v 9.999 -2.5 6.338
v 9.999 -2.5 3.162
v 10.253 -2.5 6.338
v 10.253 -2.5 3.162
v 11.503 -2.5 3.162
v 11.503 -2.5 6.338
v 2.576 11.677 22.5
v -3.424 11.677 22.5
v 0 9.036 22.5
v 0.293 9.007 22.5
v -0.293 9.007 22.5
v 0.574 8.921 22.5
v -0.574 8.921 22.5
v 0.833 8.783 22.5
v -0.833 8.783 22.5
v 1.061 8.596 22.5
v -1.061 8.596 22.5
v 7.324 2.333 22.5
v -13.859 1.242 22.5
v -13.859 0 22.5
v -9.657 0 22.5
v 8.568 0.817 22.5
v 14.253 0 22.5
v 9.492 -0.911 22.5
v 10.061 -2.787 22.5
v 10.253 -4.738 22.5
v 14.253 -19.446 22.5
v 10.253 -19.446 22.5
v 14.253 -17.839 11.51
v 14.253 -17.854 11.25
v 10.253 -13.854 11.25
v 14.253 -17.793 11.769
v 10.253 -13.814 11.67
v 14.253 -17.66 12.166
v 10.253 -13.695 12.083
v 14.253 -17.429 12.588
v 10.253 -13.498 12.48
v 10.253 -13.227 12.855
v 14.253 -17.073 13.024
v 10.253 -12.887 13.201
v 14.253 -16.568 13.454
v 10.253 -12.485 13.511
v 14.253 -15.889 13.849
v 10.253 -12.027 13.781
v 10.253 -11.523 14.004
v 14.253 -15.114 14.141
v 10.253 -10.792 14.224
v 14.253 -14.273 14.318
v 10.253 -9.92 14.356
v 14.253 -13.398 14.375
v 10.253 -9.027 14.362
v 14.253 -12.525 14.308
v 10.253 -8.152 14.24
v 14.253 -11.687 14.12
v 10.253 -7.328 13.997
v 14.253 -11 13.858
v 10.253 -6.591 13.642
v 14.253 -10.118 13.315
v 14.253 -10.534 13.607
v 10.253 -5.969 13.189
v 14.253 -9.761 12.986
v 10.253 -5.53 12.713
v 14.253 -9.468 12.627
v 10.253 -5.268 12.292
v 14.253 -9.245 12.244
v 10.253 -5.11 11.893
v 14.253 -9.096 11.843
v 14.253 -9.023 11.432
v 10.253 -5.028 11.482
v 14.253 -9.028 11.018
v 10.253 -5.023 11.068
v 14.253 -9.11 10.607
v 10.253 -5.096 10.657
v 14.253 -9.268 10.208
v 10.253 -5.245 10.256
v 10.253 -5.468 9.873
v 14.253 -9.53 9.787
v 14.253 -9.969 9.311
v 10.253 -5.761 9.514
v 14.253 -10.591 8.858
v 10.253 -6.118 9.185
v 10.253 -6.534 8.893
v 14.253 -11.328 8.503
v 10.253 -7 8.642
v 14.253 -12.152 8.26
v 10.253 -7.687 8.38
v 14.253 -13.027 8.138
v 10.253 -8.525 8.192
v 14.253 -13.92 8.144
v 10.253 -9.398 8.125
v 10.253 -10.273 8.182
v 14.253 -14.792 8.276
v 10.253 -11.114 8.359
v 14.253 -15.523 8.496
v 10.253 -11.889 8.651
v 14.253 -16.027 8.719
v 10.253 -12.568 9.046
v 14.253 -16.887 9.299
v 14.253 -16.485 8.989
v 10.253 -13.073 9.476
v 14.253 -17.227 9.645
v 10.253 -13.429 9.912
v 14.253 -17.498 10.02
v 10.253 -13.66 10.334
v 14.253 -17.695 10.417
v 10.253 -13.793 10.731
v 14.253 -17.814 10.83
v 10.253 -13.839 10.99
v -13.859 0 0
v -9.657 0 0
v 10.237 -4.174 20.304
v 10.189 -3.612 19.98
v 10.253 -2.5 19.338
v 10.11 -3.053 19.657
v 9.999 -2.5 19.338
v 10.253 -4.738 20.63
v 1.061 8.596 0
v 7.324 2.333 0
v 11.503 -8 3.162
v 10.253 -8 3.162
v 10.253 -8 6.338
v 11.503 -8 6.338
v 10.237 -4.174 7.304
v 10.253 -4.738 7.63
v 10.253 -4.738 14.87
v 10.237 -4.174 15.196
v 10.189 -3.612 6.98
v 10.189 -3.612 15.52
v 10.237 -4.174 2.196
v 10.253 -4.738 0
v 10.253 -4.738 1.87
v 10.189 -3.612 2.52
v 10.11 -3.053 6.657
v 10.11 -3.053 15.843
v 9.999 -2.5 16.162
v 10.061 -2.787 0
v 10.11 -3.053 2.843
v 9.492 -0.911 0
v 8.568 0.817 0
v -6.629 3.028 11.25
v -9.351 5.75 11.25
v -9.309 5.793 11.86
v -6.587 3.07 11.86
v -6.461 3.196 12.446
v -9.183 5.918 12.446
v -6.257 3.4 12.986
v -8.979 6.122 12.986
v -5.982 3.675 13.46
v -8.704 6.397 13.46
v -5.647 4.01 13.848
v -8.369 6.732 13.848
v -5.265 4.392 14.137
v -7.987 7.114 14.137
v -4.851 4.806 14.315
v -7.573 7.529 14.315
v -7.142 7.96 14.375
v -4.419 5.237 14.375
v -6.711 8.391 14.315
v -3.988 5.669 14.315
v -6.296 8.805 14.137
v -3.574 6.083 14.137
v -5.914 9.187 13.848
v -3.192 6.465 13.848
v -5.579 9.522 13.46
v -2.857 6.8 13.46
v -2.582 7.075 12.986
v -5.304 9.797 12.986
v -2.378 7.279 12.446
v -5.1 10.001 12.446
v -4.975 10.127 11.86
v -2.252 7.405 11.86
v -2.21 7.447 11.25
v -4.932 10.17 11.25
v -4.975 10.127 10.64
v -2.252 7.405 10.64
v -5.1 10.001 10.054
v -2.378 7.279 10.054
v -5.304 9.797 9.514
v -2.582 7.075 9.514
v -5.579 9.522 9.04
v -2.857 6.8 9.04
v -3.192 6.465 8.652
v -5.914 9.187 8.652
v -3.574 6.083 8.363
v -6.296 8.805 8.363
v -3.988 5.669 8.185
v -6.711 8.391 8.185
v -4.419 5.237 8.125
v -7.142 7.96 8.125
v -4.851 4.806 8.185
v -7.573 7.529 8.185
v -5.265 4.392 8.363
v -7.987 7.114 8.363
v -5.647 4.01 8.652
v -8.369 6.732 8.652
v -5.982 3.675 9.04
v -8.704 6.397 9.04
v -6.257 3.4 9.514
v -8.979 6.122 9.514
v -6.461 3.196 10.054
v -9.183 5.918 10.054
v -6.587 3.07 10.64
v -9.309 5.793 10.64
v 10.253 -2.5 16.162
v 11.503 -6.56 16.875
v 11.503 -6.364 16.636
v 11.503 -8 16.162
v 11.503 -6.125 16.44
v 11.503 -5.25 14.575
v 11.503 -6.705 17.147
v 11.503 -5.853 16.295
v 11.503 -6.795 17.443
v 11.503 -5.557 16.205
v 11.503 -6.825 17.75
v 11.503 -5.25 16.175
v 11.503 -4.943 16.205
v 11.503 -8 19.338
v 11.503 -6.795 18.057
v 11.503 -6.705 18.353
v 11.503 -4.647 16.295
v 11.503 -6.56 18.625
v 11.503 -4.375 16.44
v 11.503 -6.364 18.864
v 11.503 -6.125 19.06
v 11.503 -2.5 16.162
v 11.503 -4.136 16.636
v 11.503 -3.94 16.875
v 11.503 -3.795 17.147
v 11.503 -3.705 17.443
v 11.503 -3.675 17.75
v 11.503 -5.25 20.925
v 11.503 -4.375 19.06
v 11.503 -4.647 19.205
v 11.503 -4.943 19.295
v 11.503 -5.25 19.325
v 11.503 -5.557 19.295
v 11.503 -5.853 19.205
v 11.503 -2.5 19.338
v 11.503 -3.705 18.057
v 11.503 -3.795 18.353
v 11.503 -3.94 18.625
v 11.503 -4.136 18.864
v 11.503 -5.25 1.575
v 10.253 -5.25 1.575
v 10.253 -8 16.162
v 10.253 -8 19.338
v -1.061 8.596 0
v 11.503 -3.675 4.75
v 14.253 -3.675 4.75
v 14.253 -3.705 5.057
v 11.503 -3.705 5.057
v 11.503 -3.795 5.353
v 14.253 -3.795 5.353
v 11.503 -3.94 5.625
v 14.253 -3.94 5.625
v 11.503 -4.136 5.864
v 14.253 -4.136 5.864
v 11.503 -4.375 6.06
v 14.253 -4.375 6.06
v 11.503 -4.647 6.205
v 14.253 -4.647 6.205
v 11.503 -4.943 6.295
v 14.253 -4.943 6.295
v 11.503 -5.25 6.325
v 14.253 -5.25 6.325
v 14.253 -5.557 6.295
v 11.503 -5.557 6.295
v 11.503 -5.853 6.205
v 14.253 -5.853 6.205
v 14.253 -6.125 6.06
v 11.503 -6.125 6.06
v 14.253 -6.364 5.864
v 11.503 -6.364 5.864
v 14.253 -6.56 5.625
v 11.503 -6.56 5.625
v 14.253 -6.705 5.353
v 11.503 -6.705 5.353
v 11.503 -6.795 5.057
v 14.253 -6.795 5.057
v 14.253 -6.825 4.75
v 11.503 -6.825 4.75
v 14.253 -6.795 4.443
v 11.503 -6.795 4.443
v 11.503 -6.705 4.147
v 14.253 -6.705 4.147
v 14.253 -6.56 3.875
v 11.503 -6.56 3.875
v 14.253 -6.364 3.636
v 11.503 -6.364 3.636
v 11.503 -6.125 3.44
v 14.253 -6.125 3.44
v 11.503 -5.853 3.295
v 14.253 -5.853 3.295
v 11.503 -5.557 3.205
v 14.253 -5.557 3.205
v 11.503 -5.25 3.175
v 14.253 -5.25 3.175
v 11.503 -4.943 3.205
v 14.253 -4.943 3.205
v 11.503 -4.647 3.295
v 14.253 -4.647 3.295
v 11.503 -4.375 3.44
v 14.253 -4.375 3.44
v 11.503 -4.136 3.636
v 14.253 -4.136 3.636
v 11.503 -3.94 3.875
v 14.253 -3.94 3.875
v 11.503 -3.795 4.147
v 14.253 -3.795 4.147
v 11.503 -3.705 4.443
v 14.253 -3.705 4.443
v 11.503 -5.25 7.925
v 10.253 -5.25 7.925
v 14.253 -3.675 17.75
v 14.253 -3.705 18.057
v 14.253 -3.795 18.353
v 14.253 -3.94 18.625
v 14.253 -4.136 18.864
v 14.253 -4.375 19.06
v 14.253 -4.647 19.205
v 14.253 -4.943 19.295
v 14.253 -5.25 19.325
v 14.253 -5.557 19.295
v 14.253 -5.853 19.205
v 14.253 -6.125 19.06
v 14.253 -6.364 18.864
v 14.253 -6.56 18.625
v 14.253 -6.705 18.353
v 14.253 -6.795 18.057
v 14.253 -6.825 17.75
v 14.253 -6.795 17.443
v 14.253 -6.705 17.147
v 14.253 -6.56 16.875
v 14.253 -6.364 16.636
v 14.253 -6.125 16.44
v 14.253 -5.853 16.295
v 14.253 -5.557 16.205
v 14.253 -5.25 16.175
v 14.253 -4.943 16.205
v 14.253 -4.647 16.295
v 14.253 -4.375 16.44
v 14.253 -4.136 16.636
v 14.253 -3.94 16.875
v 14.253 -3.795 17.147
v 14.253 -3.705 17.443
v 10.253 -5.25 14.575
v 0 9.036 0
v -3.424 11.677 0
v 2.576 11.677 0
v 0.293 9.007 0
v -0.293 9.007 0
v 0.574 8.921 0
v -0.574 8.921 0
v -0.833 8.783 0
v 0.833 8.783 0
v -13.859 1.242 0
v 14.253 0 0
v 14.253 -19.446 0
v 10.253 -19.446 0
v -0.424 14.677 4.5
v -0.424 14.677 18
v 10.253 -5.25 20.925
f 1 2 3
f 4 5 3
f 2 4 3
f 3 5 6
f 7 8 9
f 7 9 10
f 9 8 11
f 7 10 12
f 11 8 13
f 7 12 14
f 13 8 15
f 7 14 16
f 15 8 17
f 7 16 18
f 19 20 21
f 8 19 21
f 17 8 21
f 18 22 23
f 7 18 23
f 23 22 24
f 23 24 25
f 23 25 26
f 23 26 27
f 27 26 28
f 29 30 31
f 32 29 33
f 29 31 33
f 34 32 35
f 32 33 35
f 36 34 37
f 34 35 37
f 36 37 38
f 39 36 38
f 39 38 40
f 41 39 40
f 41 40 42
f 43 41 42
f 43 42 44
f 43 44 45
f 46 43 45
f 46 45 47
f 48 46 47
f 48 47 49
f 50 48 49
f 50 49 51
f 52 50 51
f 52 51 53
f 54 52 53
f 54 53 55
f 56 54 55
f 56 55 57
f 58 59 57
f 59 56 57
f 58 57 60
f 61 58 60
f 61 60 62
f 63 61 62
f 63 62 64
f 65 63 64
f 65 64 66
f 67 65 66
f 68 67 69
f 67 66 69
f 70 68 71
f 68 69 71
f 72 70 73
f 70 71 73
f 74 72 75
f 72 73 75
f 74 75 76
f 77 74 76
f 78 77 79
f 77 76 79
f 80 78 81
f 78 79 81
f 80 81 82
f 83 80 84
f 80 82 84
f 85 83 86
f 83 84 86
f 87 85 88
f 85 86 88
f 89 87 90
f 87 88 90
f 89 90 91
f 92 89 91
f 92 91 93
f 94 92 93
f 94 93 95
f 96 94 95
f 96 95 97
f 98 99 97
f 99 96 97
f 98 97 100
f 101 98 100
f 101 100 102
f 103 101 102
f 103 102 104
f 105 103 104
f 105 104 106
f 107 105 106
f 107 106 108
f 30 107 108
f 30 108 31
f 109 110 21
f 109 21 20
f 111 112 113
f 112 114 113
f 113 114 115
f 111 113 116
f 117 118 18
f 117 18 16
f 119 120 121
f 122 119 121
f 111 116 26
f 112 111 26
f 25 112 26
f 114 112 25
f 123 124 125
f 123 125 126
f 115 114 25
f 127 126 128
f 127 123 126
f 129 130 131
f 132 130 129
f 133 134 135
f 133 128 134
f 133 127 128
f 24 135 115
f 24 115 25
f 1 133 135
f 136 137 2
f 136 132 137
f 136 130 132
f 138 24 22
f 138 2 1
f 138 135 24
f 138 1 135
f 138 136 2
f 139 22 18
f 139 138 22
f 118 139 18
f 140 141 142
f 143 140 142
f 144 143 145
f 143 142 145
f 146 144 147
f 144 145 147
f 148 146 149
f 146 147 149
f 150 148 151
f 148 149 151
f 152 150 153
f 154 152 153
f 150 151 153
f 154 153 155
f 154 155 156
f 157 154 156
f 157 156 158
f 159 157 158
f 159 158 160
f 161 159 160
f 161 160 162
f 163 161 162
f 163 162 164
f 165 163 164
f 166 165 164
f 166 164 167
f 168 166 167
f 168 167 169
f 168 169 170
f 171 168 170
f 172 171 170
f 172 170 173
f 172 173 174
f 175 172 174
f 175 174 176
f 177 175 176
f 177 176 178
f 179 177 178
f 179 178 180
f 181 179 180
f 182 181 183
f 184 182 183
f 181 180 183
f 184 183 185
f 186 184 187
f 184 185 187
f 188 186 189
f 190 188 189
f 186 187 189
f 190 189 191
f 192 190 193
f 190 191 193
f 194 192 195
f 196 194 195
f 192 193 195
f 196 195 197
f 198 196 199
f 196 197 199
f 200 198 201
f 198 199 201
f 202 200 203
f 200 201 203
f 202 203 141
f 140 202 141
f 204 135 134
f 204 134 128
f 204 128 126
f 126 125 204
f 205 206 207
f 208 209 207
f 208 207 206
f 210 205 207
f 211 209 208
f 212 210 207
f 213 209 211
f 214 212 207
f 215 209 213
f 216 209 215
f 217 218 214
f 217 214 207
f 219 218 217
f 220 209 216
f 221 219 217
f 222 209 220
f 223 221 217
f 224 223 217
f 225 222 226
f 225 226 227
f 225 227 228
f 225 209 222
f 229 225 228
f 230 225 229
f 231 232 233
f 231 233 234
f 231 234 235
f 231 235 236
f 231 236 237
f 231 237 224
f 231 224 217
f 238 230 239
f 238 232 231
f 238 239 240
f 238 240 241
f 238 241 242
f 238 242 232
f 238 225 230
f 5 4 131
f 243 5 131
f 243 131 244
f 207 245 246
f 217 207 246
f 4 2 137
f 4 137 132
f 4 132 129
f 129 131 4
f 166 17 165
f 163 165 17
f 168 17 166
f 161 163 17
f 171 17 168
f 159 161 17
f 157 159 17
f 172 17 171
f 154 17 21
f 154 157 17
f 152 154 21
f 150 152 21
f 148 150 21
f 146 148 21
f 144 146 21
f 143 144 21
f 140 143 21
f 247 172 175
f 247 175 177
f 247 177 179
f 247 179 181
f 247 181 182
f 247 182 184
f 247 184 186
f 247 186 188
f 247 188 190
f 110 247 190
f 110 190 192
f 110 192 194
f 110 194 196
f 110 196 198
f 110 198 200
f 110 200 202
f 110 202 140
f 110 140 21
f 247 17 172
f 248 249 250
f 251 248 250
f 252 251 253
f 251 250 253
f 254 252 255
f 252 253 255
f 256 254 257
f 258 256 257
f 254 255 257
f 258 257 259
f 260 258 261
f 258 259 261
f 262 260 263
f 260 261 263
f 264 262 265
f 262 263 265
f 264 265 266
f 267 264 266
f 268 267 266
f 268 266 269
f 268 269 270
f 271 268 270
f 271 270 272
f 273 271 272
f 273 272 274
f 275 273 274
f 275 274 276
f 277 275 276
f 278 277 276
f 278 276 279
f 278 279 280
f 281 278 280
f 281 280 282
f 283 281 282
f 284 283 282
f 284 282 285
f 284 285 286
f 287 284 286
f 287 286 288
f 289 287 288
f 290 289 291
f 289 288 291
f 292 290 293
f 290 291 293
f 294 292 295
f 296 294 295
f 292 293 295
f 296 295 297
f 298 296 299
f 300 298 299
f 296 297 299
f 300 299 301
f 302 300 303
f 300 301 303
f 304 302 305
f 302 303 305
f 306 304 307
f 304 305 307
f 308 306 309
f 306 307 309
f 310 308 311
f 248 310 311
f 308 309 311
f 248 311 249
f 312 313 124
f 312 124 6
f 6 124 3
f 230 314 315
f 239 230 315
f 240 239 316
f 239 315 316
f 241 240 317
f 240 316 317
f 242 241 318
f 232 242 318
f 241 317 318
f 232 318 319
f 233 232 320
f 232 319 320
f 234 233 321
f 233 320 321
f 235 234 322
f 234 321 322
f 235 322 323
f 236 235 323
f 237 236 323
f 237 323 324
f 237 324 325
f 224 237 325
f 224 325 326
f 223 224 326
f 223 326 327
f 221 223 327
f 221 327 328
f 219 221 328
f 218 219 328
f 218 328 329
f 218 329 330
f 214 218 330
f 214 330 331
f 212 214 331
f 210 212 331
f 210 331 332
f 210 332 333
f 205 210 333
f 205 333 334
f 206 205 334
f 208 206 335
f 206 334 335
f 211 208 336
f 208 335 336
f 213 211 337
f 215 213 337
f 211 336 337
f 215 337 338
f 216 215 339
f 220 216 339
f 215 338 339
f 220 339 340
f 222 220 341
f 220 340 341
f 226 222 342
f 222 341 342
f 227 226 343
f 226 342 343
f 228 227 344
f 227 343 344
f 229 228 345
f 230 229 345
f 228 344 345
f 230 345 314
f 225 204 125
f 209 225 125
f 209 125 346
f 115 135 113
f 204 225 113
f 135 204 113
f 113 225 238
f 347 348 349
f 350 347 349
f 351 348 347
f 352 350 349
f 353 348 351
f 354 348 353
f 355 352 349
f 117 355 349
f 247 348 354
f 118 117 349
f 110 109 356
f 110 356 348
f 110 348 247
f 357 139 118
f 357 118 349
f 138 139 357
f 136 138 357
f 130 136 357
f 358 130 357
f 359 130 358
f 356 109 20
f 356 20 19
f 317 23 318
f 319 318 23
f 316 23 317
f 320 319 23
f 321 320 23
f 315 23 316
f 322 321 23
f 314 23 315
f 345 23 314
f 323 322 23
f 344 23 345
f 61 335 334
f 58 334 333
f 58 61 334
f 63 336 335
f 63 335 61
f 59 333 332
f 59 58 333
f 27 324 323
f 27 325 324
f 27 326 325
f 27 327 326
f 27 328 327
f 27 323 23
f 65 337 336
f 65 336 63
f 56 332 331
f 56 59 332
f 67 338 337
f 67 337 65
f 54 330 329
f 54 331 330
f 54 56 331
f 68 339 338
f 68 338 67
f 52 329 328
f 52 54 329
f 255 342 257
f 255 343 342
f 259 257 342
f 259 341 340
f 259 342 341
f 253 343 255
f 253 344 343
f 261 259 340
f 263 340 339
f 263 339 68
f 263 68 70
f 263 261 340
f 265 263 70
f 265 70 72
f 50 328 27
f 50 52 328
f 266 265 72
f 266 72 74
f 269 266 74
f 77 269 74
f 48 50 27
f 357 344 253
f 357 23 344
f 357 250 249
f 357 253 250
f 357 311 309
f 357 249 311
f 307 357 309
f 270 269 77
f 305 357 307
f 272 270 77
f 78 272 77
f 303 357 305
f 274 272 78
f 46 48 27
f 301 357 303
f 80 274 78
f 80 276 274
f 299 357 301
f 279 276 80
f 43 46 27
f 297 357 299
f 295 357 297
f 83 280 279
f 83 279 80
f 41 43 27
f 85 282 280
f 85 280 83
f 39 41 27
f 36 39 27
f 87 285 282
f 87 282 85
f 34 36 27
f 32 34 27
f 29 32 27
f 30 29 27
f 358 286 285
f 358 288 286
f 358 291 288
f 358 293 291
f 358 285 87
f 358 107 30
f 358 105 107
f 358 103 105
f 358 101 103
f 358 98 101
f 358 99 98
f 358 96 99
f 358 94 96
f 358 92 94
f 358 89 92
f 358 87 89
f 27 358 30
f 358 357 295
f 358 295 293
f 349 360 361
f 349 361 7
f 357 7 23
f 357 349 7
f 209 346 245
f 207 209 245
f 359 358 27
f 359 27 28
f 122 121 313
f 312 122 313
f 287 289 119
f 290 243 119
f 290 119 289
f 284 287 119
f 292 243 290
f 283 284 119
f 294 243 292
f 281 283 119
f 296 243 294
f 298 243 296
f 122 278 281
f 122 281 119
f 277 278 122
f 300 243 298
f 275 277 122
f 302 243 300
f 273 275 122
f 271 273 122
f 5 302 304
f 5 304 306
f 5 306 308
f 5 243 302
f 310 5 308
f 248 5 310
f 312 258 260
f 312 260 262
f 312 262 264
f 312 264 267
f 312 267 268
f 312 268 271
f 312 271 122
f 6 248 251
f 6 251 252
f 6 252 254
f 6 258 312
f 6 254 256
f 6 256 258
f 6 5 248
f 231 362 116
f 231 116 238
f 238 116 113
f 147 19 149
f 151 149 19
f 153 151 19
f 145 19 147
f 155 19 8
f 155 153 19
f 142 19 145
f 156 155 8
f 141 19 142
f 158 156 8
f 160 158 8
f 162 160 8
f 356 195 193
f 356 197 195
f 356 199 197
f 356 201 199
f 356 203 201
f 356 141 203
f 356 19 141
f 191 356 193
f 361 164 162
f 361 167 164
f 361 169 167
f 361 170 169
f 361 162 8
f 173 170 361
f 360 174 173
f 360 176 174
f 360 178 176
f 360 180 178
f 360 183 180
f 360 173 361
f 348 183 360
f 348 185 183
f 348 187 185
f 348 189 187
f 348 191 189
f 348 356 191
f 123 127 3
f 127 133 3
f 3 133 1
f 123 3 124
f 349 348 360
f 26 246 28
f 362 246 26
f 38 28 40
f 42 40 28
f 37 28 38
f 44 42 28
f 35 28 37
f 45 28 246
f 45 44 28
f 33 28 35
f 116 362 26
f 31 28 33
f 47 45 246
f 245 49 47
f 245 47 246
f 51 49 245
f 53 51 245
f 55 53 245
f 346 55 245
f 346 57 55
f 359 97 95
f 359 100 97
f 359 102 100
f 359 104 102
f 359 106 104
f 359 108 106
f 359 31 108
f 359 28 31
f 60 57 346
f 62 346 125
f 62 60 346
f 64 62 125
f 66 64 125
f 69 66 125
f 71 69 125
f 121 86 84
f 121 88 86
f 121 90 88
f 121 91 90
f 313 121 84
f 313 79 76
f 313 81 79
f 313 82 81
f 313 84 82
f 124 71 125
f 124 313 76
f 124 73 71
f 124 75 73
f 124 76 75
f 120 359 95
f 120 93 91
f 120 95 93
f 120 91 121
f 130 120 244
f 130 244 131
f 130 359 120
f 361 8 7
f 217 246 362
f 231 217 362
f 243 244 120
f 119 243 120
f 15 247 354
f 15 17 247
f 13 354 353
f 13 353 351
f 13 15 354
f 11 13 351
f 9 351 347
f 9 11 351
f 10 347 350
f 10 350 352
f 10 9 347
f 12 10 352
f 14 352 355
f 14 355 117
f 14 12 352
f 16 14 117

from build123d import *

# Parameters (mm, degrees)
EXTRUDE_505_DEPTH      = 22.5
SKETCH_2_R             = 3.125
SMA_DEPTH              = 42.358123054
SKETCH_3_R             = 1.575
CUT_EXTRUDE_957_DEPTH  = 41.923198727
CUT_EXTRUDE_2_DEPTH    = 1.25
CUT_EXTRUDE_1673_DEPTH = 42.700155069
FILLET_1_R             = 10
FILLET_2_R             = 1.5


with BuildPart() as part:
    # Sketch 1 → Extrude 505 (new body)
    with BuildSketch(Plane.XY):
        Polygon((14.253048327, 0), (14.253048327, -19.446194078), (10.253048327, -19.446194078), (10.253048327, -0.596194078), (0, 9.656854249), (-9.656854249, 0), (-13.859292911, 0), (-13.859292911, 1.242283553), (-0.424264069, 14.677312396), align=None)
    extrude(amount=EXTRUDE_505_DEPTH)

    # Sketch 2 → SMA接口 (cut, through all)
    with BuildSketch(Plane(origin=(-7.550788232, 7.550788232, 0), x_dir=(0, 0, 1), z_dir=(-0.7071067811865486, 0.7071067811865465, 0))):
        with Locations(Location((11.25, 0.578427125, 0), (0, 0, 270))):
            Circle(SKETCH_2_R)
    extrude(amount=-SMA_DEPTH, mode=Mode.SUBTRACT)

    # 草图3 → Cut-Extrude 957 (cut, through all)
    with BuildSketch(Plane(origin=(14.253048327, 0, 0), x_dir=(0, 0, -1), z_dir=(1, 0, 0))):
        with Locations(Location((-17.75, -5.25, 0), (0, 0, 90))):
            Circle(SKETCH_3_R)
        with Locations(Location((-4.75, -5.25, 0), (0, 0, 90))):
            Circle(SKETCH_3_R)
    extrude(amount=-CUT_EXTRUDE_957_DEPTH, mode=Mode.SUBTRACT)

    # 草图4 → 侧板接口-2 (cut)
    with BuildSketch(Plane.ZY.offset(-10.253048327)):
        Polygon((6.33771324, -8), (7.925426481, -5.25), (6.33771324, -2.5), (3.16228676, -2.5), (1.574573519, -5.25), (3.16228676, -8), align=None)
        Polygon((19.33771324, -8), (20.925426481, -5.25), (19.33771324, -2.5), (16.16228676, -2.5), (14.574573519, -5.25), (16.16228676, -8), align=None)
    extrude(amount=-CUT_EXTRUDE_2_DEPTH, mode=Mode.SUBTRACT)

    # 草图7 → Cut-Extrude 1673 (cut, through all)
    with BuildSketch(Plane(origin=(0, 8.084293197, -5.389528798), x_dir=(-1, 0, 0), z_dir=(0, -0.8320502943378436, 0.5547001962252295))):
        Polygon((0.424264069, -11.885734391), (-2.575735931, -6.477407477), (3.424264069, -6.477407477), align=None)
    cut_extrude_1673 = extrude(amount=-CUT_EXTRUDE_1673_DEPTH, mode=Mode.SUBTRACT)

    # 镜向1: Cut-Extrude 1673 across plane
    add(cut_extrude_1673.mirror(Plane.XY.offset(11.25)), mode=Mode.SUBTRACT)

    # 圆角1
    # the kernel refuses this fillet: 10 mm, written as the material it adds along each edge
    with BuildSketch(Plane(origin=(10.253048327, -0.596194078, 0), x_dir=(-0.7071067811865485, 0.7071067811865465, 0), z_dir=(0, 0, 1))) as fillet_1_piece_1_section:
        with BuildLine():
            CenterArc((FILLET_1_R * 0.414213562373, FILLET_1_R), FILLET_1_R, 225, 45)
            Line((-FILLET_1_R * 0.292893218813, FILLET_1_R * 0.292893218813), (0, 0))
            Line((0, 0), (FILLET_1_R * 0.414213562373, 0))
        make_face()
    fillet_1_piece_1 = extrude(amount=22.5, mode=Mode.PRIVATE)
    fillet_1_piece_1 = split(fillet_1_piece_1, bisect_by=Plane(origin=(9.571569557, -2.5, 2.084142207), z_dir=(0, 1, 0)), keep=Keep.TOP, mode=Mode.PRIVATE)
    add(fillet_1_piece_1)
    with BuildSketch(Plane(origin=(10.253048327, -0.596194078, 0), x_dir=(-0.7071067811865485, 0.7071067811865465, 0), z_dir=(0, 0, 1))) as fillet_1_piece_2_section:
        with BuildLine():
            CenterArc((FILLET_1_R * 0.414213562373, FILLET_1_R), FILLET_1_R, 225, 45)
            Line((-FILLET_1_R * 0.292893218813, FILLET_1_R * 0.292893218813), (0, 0))
            Line((0, 0), (FILLET_1_R * 0.414213562373, 0))
        make_face()
    fillet_1_piece_2 = extrude(amount=32.855339059, mode=Mode.PRIVATE)
    fillet_1_piece_2 = split(fillet_1_piece_2, bisect_by=Plane(origin=(10.174215165, -3.639691918, 2.504285324), z_dir=(0, 0.49999999999999994, -0.8660254037844389)), keep=Keep.TOP, mode=Mode.PRIVATE)
    add(fillet_1_piece_2)
    with BuildSketch(Plane(origin=(10.253048327, -0.596194078, -10.355339059), x_dir=(-0.7071067811865485, 0.7071067811865465, 0), z_dir=(0, 0, 1))) as fillet_1_piece_3_section:
        with BuildLine():
            CenterArc((FILLET_1_R * 0.414213562373, FILLET_1_R), FILLET_1_R, 225, 45)
            Line((-FILLET_1_R * 0.292893218813, FILLET_1_R * 0.292893218813), (0, 0))
            Line((0, 0), (FILLET_1_R * 0.414213562373, 0))
        make_face()
    fillet_1_piece_3 = extrude(amount=43.210678119, mode=Mode.PRIVATE)
    fillet_1_piece_3 = split(fillet_1_piece_3, bisect_by=Plane(origin=(10.175314786, -5.028011676, 14.702738538), z_dir=(0, 0.4999999999999995, -0.8660254037844389)), keep=Keep.TOP, mode=Mode.PRIVATE)
    fillet_1_piece_3 = split(fillet_1_piece_3, bisect_by=Plane(origin=(10.175314786, -5.028011676, 7.797261462), z_dir=(0, 0.49999999999999994, 0.8660254037844387)), keep=Keep.TOP, mode=Mode.PRIVATE)
    add(fillet_1_piece_3)
    with BuildSketch(Plane(origin=(10.253048327, -0.596194078, -10.355339059), x_dir=(-0.7071067811865485, 0.7071067811865465, 0), z_dir=(0, 0, 1))) as fillet_1_piece_4_section:
        with BuildLine():
            CenterArc((FILLET_1_R * 0.414213562373, FILLET_1_R), FILLET_1_R, 225, 45)
            Line((-FILLET_1_R * 0.292893218813, FILLET_1_R * 0.292893218813), (0, 0))
            Line((0, 0), (FILLET_1_R * 0.414213562373, 0))
        make_face()
    fillet_1_piece_4 = extrude(amount=32.855339059, mode=Mode.PRIVATE)
    fillet_1_piece_4 = split(fillet_1_piece_4, bisect_by=Plane(origin=(10.174215165, -3.639691918, 19.995714676), z_dir=(0, 0.4999999999999997, 0.8660254037844388)), keep=Keep.TOP, mode=Mode.PRIVATE)
    add(fillet_1_piece_4)

    # 圆角2
    fillet_2_edges = [part.edges().sort_by_distance(p)[0] for p in [
        (0, 9.656854249, 11.25),
    ]]
    fillet(fillet_2_edges, radius=FILLET_2_R)


solid = part.part
